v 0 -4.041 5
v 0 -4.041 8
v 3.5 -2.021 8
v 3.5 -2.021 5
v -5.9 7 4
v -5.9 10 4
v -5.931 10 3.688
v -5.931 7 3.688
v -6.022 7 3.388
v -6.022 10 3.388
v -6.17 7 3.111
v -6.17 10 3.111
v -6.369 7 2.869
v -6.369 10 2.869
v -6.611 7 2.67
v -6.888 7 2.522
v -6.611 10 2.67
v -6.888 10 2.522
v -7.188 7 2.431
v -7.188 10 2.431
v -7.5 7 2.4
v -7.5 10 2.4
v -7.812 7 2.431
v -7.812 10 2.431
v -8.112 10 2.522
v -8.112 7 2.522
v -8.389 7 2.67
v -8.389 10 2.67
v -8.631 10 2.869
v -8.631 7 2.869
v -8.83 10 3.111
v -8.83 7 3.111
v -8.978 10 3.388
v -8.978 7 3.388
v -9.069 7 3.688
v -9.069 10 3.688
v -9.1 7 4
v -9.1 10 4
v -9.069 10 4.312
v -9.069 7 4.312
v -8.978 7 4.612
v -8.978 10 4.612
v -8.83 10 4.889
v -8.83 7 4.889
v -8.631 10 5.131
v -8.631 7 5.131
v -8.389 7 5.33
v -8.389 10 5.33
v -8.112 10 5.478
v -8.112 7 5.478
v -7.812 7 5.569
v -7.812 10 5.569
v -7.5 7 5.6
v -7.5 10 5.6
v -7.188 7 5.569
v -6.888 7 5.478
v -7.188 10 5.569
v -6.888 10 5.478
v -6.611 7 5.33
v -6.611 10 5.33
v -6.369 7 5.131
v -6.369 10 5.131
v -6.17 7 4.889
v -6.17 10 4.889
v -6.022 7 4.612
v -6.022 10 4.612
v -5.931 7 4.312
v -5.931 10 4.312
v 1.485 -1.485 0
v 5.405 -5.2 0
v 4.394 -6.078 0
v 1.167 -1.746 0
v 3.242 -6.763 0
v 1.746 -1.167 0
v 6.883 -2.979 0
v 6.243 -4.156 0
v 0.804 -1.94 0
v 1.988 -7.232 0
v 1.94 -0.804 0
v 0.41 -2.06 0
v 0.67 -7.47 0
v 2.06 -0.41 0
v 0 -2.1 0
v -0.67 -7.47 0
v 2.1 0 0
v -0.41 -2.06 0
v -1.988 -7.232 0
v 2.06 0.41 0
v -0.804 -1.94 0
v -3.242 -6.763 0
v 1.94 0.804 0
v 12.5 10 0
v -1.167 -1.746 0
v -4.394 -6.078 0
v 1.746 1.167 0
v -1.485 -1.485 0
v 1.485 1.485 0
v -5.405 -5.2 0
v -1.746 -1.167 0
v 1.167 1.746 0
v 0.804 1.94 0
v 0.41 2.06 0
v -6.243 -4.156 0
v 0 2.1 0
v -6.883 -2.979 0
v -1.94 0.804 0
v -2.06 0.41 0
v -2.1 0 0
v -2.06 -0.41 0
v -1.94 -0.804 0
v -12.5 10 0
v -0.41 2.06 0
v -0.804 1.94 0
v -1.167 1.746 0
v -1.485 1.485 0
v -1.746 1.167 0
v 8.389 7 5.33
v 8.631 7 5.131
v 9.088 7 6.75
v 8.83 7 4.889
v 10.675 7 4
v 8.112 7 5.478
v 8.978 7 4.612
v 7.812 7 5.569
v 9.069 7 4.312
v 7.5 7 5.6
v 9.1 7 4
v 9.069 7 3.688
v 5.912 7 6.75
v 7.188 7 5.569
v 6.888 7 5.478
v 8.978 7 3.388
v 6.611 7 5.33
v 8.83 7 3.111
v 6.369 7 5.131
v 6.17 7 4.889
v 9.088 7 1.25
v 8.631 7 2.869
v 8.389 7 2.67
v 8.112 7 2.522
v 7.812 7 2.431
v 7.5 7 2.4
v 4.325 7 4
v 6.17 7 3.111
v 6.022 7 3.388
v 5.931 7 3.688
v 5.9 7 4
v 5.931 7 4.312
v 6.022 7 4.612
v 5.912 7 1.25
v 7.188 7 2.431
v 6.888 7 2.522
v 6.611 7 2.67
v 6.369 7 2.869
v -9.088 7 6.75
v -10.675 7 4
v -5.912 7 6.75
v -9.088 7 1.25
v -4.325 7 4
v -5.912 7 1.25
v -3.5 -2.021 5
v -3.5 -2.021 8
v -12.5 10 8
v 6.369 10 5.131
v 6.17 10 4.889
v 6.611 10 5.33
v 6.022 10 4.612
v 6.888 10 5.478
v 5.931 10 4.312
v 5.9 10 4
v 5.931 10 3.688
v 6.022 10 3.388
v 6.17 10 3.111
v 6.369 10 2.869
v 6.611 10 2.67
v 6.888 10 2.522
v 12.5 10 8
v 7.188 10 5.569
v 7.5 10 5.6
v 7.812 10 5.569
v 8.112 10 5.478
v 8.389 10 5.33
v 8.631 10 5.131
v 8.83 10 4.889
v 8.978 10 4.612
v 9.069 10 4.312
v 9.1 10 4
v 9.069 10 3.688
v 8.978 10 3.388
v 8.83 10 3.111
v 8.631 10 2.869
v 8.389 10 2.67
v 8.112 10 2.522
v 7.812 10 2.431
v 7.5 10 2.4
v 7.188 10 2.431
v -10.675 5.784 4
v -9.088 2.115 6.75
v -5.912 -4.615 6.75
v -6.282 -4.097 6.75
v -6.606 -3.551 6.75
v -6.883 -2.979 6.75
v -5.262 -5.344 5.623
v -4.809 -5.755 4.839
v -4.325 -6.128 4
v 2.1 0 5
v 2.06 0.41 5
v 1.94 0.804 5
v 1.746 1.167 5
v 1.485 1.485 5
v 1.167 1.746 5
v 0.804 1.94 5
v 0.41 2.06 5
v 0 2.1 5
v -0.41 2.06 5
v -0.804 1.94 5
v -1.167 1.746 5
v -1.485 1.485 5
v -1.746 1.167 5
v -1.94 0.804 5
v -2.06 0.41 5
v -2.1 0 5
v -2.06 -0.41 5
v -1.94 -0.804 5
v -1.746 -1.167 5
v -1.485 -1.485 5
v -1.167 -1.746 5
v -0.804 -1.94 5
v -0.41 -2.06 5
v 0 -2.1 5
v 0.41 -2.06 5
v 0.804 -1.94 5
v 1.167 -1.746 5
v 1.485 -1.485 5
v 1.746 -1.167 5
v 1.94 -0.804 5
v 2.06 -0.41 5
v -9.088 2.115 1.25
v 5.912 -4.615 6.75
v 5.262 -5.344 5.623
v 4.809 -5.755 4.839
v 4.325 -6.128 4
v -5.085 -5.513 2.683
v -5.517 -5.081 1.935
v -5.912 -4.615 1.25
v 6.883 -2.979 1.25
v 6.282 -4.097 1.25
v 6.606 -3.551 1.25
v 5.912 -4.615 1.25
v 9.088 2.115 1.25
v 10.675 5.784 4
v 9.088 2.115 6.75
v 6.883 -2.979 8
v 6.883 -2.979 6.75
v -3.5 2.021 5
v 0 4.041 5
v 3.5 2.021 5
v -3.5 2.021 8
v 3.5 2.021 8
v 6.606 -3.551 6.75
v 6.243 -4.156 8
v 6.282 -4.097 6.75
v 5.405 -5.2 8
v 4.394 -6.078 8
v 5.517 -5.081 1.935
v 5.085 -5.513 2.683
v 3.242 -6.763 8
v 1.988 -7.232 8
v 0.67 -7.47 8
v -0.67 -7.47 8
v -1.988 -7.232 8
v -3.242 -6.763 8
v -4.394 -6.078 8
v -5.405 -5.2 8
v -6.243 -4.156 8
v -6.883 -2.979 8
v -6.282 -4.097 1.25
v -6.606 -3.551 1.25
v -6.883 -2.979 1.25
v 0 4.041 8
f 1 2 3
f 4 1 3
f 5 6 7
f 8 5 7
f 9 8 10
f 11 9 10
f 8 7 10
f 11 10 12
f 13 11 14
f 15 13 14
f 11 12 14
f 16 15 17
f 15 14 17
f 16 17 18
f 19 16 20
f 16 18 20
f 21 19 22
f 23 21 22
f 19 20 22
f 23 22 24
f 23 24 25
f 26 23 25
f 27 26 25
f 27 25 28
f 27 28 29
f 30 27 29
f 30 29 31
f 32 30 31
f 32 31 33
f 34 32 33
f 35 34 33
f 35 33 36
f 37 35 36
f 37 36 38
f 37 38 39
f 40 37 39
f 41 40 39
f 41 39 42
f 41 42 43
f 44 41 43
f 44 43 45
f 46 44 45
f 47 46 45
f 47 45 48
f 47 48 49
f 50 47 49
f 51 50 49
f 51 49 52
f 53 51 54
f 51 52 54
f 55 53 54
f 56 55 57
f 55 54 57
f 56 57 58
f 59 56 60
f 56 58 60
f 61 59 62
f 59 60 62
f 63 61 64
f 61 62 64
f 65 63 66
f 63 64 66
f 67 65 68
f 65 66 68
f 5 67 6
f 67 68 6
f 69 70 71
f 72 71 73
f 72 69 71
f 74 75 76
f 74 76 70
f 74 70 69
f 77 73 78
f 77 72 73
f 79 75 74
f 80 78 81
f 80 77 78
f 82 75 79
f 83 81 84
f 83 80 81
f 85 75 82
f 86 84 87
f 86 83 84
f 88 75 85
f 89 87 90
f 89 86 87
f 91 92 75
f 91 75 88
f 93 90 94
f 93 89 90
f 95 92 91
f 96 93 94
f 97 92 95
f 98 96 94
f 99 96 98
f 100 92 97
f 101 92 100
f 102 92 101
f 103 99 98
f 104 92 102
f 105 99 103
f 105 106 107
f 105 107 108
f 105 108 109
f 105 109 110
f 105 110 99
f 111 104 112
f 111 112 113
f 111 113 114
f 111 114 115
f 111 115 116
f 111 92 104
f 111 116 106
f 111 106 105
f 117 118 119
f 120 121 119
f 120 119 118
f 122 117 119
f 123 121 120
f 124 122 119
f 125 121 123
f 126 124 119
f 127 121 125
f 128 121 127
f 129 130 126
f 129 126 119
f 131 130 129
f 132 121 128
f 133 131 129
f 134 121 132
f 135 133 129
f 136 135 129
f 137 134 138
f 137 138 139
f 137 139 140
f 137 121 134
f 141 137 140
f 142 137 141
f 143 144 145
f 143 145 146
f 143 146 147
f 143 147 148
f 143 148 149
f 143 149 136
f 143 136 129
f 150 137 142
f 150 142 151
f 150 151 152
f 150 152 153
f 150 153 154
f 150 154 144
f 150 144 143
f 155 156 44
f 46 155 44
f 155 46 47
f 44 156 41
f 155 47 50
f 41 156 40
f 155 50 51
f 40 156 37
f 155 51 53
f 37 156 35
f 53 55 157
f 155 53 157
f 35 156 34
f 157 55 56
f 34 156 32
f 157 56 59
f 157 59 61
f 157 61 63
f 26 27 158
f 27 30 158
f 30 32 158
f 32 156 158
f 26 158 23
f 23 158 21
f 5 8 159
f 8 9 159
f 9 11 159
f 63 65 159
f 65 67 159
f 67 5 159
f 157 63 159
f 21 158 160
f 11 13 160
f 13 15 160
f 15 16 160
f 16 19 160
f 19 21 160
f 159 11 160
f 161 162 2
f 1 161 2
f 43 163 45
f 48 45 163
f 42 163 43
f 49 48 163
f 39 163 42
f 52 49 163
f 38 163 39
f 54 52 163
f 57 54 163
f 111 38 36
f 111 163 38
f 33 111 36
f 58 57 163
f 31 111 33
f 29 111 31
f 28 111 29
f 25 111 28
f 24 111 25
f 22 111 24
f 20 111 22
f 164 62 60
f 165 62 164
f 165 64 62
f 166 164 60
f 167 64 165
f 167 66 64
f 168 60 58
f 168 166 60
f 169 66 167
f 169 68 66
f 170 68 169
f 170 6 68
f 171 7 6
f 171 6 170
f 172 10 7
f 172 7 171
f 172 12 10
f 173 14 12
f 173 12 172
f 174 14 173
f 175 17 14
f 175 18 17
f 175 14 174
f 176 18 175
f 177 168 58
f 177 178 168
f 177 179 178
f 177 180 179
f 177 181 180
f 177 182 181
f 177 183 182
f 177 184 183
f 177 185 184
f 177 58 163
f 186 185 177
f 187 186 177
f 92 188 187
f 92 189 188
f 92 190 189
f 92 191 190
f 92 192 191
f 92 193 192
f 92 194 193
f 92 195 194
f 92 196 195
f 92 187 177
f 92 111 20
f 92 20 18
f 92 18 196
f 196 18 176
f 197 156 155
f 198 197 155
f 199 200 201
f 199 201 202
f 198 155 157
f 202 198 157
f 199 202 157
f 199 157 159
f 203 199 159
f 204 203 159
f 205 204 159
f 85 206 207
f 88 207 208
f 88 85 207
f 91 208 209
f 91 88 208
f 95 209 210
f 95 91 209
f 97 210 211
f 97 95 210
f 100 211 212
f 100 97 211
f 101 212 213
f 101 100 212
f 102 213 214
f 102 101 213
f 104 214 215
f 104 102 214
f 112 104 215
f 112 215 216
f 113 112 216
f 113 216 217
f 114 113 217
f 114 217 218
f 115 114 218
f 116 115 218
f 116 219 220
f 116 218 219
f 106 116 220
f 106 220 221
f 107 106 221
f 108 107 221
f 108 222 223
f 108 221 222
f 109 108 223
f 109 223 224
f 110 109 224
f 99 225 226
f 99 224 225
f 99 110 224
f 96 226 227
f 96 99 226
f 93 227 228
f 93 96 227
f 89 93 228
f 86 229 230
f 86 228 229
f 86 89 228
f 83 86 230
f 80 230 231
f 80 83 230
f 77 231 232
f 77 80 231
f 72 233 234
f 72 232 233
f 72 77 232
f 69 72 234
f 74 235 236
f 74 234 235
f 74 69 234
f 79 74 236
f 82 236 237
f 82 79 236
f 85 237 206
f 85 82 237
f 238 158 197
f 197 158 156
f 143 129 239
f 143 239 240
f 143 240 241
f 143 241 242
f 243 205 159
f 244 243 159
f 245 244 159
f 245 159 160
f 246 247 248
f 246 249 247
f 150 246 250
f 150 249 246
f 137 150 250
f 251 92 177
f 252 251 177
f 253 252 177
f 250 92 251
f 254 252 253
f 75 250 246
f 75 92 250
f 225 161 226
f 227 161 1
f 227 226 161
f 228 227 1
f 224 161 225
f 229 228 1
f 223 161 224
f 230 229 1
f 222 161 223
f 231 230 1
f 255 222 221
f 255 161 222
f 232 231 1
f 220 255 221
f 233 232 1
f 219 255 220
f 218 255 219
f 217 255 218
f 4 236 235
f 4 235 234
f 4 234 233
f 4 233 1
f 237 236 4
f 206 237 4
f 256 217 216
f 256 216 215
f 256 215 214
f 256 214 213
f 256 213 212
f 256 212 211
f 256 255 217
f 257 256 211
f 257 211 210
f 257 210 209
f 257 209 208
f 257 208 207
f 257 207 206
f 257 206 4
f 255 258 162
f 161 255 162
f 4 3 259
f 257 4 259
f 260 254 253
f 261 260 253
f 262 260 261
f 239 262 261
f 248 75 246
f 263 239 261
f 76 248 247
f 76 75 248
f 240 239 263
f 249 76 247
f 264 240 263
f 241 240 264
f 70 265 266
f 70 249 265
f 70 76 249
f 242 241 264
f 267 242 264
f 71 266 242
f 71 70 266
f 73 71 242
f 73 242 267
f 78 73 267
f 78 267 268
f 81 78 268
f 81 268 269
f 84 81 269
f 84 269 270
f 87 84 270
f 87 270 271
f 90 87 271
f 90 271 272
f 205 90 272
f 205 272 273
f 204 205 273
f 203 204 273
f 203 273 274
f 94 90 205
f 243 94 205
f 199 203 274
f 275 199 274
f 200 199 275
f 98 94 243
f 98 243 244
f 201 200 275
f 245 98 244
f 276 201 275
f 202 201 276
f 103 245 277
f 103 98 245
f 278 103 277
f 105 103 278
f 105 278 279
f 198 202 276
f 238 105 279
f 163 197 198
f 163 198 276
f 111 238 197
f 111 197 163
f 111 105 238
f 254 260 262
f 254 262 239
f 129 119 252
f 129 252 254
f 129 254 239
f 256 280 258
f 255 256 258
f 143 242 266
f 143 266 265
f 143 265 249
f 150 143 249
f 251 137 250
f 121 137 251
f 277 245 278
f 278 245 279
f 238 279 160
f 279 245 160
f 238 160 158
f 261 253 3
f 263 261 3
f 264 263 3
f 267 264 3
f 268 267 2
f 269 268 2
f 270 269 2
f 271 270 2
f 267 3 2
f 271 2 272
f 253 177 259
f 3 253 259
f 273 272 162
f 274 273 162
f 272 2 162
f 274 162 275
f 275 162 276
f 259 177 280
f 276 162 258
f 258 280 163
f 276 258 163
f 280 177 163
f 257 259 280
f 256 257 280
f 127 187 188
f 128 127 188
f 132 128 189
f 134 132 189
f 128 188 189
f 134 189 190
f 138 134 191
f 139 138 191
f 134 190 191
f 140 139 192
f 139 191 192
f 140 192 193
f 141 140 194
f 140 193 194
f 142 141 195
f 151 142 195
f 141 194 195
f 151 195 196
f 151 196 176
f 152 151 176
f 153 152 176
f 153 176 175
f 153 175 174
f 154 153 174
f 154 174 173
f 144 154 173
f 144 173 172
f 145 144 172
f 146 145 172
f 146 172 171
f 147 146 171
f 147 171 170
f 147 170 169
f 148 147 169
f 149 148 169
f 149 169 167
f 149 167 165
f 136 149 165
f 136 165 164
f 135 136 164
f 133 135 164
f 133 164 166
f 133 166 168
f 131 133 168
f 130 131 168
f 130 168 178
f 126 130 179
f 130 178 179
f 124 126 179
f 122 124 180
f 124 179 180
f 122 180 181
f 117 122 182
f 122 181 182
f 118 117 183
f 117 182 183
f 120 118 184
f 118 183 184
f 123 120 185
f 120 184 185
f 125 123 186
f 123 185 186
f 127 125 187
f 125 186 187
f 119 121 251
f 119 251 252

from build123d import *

# Parameters (mm, degrees)
SKETCH1_R           = 2.1
BOSS_EXTRUDE1_DEPTH = 8
SKETCH2_R           = 1.6
CUT_EXTRUDE1_DEPTH  = 18.5
CUT_EXTRUDE2_DEPTH  = 3
CUT_EXTRUDE3_START  = -3
CUT_EXTRUDE3_DEPTH  = 15.5000001


with BuildPart() as part:
    # Sketch1 → Boss-Extrude1 (new body)
    with BuildSketch(Plane.XY):
        with BuildLine():
            Line((-6.883064085, -2.978830106), (-12.5, 10))
            Line((-12.5, 10), (12.5, 10))
            Line((12.5, 10), (6.883064085, -2.978830106))
            ThreePointArc((6.883064085, -2.978830106), (0, -7.5), (-6.883064085, -2.978830106))
        make_face()
        Circle(SKETCH1_R, mode=Mode.SUBTRACT)
    extrude(amount=BOSS_EXTRUDE1_DEPTH)

    # Sketch2 → Cut-Extrude1 (cut, through all)
    with BuildSketch(Plane(origin=(0, 10, 0), x_dir=(1, 0, 0), z_dir=(0, 1, 0))):
        with Locations((-7.5, -4)):
            Circle(SKETCH2_R)
        with Locations((7.5, -4)):
            Circle(SKETCH2_R)
    extrude(amount=-CUT_EXTRUDE1_DEPTH, mode=Mode.SUBTRACT)

    # Sketch3 → Cut-Extrude2 (cut)
    with BuildSketch(Plane.XY.offset(8)):
        Polygon((0, -4.041451884), (3.5, -2.020725942), (3.5, 2.020725942), (0, 4.041451884), (-3.5, 2.020725942), (-3.5, -2.020725942), align=None)
    extrude(amount=-CUT_EXTRUDE2_DEPTH, mode=Mode.SUBTRACT)

    # Sketch4 → Cut-Extrude3 (cut, through all)
    with BuildSketch(Plane(origin=(0, 10, 0), x_dir=(1, 0, 0), z_dir=(0, 1, 0)).offset(CUT_EXTRUDE3_START)):
        Polygon((-5.91228676, -6.75), (-4.324573519, -4), (-5.91228676, -1.25), (-9.08771324, -1.25), (-10.675426481, -4), (-9.08771324, -6.75), align=None)
        Polygon((9.08771324, -6.75), (5.91228676, -6.75), (4.324573519, -4), (5.91228676, -1.25), (9.08771324, -1.25), (10.675426481, -4), align=None)
    extrude(amount=-CUT_EXTRUDE3_DEPTH, mode=Mode.SUBTRACT)


solid = part.part
